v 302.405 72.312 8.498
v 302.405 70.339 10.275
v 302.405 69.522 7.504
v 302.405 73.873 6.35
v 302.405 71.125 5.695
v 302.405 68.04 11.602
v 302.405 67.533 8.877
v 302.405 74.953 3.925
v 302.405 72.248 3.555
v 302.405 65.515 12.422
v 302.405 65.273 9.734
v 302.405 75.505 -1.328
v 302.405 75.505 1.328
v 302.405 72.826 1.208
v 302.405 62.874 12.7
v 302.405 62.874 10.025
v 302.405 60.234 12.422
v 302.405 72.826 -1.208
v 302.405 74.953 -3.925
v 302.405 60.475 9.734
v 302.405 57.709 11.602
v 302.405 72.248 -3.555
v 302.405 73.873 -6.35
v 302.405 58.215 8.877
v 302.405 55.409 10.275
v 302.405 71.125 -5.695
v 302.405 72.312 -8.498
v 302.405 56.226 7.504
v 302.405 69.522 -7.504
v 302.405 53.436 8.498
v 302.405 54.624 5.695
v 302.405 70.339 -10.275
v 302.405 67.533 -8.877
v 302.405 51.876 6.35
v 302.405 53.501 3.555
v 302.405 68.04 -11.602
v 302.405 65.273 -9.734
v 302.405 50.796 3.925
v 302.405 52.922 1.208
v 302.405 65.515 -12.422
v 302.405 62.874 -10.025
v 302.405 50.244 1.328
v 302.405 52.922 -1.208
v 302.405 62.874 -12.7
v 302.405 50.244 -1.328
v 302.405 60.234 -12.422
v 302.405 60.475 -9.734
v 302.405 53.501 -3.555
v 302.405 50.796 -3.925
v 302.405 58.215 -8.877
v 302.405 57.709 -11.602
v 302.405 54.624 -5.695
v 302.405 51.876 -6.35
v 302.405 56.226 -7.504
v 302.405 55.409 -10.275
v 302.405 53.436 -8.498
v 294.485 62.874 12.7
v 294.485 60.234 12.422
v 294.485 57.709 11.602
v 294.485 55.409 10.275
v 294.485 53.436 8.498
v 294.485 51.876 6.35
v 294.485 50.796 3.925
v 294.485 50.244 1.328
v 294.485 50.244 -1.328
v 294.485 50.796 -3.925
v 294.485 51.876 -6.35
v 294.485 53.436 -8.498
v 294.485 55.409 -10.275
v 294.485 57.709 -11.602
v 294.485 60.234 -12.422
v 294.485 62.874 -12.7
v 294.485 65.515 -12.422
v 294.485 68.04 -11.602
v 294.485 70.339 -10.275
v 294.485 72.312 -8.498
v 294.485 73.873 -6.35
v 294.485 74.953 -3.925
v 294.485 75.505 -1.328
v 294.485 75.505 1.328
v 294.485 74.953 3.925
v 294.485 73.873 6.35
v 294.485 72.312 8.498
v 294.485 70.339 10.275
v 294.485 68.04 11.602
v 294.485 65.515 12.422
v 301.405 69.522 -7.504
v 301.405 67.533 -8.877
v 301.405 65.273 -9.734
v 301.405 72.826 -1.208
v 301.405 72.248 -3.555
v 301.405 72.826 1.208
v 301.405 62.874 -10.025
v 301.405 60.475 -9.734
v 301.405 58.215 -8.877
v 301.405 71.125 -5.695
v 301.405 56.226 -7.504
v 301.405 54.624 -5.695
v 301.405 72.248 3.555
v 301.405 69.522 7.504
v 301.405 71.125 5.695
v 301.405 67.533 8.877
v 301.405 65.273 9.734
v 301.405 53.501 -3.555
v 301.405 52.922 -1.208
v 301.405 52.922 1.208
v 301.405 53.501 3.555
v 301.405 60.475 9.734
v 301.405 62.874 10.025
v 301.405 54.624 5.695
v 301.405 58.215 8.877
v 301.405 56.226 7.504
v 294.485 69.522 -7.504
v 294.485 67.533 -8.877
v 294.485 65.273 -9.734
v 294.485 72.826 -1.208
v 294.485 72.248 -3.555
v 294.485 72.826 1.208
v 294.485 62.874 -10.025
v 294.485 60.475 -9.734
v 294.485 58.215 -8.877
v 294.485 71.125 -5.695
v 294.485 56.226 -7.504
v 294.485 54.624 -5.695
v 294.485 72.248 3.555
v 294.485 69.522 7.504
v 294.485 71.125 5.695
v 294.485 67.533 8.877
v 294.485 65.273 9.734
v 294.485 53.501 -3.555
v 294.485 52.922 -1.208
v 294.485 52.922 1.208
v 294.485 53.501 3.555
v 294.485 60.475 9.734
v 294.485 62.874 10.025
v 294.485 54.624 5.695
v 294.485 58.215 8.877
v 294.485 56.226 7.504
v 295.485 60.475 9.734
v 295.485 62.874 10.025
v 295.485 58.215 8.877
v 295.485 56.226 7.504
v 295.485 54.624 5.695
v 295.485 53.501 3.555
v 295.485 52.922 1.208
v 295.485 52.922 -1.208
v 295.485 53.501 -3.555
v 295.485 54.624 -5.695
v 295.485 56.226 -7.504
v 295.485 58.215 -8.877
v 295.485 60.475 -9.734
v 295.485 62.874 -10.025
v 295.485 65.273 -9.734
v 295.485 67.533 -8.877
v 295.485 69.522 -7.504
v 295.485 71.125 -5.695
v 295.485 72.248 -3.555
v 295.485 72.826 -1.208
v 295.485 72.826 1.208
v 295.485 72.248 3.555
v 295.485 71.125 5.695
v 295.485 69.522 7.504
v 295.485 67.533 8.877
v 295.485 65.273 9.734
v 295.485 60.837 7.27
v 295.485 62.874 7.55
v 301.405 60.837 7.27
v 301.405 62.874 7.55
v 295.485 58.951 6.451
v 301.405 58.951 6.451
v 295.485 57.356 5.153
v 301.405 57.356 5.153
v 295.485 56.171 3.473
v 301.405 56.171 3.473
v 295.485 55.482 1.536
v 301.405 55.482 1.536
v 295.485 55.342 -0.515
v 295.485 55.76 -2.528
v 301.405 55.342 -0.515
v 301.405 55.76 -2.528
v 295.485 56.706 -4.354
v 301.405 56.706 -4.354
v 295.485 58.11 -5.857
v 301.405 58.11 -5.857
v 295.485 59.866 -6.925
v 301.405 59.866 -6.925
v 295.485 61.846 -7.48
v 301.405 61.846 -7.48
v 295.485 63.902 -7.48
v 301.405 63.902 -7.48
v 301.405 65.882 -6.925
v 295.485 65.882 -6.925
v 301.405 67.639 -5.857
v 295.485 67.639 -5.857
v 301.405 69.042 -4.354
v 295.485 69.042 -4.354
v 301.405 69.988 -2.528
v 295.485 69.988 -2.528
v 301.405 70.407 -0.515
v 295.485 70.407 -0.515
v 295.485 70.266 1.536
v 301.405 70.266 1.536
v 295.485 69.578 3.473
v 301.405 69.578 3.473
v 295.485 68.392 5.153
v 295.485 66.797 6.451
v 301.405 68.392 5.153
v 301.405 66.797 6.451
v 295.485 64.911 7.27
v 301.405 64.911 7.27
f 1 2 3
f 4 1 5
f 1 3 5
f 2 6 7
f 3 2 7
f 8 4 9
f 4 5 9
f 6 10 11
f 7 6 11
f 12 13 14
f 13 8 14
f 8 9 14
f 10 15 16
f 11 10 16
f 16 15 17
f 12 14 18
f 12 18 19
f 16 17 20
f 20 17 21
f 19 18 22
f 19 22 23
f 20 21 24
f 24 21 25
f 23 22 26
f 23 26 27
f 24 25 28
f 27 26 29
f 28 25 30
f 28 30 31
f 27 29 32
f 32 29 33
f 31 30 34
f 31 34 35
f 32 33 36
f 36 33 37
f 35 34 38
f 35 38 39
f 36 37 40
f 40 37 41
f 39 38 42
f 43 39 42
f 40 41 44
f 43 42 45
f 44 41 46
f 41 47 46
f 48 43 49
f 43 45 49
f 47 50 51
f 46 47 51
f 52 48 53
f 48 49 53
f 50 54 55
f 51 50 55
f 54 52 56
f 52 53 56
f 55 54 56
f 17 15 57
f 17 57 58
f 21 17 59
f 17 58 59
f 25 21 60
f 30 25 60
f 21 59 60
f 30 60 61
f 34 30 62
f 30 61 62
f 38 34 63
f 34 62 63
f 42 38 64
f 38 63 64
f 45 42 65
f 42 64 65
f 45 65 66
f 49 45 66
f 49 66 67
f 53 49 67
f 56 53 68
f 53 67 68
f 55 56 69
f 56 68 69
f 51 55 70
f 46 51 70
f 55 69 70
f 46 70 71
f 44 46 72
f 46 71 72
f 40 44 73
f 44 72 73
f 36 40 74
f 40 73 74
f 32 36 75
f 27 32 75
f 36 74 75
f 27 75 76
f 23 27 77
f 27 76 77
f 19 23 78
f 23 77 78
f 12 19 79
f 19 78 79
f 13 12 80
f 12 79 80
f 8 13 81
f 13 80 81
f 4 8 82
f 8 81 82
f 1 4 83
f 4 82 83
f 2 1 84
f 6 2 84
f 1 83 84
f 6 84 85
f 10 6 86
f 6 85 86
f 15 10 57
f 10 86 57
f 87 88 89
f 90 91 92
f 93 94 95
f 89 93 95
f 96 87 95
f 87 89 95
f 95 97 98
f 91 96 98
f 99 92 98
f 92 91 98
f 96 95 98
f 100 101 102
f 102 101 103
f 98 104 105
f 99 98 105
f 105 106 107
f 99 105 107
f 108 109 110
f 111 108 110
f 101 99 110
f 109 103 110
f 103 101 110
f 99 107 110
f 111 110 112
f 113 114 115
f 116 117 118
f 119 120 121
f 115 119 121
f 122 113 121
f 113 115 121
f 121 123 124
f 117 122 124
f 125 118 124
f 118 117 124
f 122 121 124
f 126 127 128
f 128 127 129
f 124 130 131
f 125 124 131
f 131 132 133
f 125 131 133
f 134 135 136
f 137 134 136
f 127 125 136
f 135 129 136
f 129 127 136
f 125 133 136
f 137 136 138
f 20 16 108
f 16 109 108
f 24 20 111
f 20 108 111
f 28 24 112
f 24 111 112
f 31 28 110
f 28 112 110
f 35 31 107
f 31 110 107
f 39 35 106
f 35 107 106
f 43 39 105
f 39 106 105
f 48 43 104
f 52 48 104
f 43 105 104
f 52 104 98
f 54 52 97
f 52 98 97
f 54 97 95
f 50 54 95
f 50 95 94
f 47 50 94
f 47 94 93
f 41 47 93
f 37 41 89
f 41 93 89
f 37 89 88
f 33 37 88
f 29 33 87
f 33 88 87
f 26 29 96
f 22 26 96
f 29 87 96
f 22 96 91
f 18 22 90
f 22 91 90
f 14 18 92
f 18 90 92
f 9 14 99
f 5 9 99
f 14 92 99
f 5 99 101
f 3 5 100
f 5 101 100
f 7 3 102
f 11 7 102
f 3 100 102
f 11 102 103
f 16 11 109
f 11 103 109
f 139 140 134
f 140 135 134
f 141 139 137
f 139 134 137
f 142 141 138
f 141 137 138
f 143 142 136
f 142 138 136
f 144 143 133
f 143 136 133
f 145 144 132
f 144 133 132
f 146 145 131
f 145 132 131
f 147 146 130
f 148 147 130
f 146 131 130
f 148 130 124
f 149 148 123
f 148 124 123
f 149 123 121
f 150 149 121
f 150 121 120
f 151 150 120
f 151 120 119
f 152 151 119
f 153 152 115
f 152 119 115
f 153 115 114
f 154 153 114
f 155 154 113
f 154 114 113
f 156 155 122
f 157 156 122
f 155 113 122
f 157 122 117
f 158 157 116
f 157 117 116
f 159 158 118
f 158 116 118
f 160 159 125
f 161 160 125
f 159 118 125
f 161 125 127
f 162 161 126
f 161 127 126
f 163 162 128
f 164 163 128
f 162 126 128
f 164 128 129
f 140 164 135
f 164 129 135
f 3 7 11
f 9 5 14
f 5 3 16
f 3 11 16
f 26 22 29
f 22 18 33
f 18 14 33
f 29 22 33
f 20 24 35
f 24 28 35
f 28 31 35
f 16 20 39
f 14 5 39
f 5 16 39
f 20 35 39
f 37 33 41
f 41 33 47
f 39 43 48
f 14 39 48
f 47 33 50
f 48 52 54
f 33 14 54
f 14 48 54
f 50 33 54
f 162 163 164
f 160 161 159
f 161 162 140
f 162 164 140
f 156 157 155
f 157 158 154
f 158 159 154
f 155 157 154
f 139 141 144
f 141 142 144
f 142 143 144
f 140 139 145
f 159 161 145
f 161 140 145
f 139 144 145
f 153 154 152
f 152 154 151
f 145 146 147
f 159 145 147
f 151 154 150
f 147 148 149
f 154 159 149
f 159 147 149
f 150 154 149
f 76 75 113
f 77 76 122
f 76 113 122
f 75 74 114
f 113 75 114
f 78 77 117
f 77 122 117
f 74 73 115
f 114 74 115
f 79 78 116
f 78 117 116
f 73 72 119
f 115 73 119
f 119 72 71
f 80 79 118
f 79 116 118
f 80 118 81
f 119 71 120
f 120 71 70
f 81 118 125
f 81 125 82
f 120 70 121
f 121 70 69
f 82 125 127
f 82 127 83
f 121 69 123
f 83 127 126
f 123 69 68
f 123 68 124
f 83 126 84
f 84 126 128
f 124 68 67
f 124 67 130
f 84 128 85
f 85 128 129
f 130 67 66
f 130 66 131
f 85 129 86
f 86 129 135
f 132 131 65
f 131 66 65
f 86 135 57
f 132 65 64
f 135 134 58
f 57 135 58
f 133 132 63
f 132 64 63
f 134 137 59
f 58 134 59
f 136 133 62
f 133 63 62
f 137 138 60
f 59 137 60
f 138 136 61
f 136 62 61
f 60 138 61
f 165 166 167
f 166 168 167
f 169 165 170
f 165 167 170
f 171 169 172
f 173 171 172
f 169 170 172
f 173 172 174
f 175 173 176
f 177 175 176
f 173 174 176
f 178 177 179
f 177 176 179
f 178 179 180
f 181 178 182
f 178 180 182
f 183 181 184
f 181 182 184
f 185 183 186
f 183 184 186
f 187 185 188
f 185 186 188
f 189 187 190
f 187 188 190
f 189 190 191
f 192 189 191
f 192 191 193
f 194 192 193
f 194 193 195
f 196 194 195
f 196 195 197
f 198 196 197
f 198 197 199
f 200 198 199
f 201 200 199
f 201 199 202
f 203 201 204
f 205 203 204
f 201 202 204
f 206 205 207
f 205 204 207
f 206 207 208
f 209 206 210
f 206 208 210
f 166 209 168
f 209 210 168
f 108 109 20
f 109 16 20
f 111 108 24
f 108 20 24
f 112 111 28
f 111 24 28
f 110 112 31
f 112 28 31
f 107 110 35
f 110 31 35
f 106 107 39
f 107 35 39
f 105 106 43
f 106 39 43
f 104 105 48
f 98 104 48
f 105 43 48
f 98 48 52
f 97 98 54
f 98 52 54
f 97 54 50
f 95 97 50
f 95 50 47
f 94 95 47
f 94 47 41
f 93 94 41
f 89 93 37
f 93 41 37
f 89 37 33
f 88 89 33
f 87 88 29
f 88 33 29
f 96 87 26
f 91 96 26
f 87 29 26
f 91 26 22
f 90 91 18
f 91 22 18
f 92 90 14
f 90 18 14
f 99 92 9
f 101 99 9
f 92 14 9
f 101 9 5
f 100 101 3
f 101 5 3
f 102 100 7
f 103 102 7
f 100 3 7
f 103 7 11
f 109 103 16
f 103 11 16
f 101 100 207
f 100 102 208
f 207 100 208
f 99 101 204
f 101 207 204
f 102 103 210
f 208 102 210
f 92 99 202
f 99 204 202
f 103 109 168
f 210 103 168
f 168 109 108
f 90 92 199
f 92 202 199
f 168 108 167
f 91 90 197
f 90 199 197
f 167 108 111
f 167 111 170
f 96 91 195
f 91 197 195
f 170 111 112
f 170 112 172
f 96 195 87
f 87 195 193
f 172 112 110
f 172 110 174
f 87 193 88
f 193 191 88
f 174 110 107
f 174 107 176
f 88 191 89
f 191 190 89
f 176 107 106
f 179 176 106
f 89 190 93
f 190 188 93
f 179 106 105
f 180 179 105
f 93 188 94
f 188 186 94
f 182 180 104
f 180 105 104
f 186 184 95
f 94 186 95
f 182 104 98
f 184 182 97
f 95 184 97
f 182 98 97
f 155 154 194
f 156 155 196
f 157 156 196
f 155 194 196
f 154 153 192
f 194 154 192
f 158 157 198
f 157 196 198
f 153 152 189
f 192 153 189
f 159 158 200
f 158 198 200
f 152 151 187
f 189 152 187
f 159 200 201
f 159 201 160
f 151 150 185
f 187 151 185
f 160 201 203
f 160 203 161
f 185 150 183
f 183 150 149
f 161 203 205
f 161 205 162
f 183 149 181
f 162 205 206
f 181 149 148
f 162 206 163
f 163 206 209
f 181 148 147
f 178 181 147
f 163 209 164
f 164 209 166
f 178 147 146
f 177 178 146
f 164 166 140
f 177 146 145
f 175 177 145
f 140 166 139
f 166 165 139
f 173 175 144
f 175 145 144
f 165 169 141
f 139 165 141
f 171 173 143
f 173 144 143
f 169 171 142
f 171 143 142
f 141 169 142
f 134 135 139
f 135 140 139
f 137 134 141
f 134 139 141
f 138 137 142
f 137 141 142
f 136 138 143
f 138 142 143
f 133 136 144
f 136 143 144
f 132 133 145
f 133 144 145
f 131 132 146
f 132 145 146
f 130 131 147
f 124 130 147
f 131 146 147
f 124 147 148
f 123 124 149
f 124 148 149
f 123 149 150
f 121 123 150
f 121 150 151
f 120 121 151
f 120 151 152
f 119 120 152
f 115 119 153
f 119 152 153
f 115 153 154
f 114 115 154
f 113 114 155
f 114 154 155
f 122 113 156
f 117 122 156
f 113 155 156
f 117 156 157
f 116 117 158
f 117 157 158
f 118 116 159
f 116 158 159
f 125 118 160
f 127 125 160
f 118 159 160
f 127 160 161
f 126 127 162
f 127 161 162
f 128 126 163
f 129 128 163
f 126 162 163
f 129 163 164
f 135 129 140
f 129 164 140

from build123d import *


with BuildPart() as part:
    # Sketch 1 → Revolve 1 (revolve)
    with BuildSketch(Plane.XY, mode=Mode.PRIVATE) as revolve_1_sk:
        Polygon((302.404713074, 75.574237467), (294.484713074, 75.574237467), (294.484713074, 72.899237467), (295.484713074, 72.899237467), (295.484713074, 70.424237467), (301.404713074, 70.424237467), (301.404713074, 72.899237467), (302.404713074, 72.899237467), align=None)
    revolve(revolve_1_sk.sketch.rotate(Axis((286.622526245, 62.874237467, 0), (1, 0, 0)), 90), axis=Axis((286.622526245, 62.874237467, 0), (1, 0, 0)))  # turned: the seam where the file's is


with BuildPart() as body_2:
    # Sketch 1_4 one side → Revolve 2 (revolve)
    with BuildSketch(Plane.XY, mode=Mode.PRIVATE) as revolve_2_sk:
        Polygon((295.484713074, 70.424237467), (295.484713074, 72.899237467), (294.484713074, 72.899237467), (294.484713074, 62.874237467), (295.484713074, 62.874237467), align=None)
    revolve(revolve_2_sk.sketch.rotate(Axis((286.622526245, 62.874237467, 0), (1, 0, 0)), 90), axis=Axis((286.622526245, 62.874237467, 0), (1, 0, 0)))  # turned: the seam where the file's is


with BuildPart() as body_3:
    # Sketch 1_5 one side → Revolve 3 (revolve)
    with BuildSketch(Plane.XY, mode=Mode.PRIVATE) as revolve_3_sk:
        Polygon((301.404713074, 62.874237467), (302.404713074, 62.874237467), (302.404713074, 72.899237467), (301.404713074, 72.899237467), (301.404713074, 70.424237467), align=None)
    revolve(revolve_3_sk.sketch.rotate(Axis((286.622526245, 62.874237467, 0), (1, 0, 0)), 90), axis=Axis((286.622526245, 62.874237467, 0), (1, 0, 0)))  # turned: the seam where the file's is


solid = Compound([part.part, body_2.part, body_3.part])
